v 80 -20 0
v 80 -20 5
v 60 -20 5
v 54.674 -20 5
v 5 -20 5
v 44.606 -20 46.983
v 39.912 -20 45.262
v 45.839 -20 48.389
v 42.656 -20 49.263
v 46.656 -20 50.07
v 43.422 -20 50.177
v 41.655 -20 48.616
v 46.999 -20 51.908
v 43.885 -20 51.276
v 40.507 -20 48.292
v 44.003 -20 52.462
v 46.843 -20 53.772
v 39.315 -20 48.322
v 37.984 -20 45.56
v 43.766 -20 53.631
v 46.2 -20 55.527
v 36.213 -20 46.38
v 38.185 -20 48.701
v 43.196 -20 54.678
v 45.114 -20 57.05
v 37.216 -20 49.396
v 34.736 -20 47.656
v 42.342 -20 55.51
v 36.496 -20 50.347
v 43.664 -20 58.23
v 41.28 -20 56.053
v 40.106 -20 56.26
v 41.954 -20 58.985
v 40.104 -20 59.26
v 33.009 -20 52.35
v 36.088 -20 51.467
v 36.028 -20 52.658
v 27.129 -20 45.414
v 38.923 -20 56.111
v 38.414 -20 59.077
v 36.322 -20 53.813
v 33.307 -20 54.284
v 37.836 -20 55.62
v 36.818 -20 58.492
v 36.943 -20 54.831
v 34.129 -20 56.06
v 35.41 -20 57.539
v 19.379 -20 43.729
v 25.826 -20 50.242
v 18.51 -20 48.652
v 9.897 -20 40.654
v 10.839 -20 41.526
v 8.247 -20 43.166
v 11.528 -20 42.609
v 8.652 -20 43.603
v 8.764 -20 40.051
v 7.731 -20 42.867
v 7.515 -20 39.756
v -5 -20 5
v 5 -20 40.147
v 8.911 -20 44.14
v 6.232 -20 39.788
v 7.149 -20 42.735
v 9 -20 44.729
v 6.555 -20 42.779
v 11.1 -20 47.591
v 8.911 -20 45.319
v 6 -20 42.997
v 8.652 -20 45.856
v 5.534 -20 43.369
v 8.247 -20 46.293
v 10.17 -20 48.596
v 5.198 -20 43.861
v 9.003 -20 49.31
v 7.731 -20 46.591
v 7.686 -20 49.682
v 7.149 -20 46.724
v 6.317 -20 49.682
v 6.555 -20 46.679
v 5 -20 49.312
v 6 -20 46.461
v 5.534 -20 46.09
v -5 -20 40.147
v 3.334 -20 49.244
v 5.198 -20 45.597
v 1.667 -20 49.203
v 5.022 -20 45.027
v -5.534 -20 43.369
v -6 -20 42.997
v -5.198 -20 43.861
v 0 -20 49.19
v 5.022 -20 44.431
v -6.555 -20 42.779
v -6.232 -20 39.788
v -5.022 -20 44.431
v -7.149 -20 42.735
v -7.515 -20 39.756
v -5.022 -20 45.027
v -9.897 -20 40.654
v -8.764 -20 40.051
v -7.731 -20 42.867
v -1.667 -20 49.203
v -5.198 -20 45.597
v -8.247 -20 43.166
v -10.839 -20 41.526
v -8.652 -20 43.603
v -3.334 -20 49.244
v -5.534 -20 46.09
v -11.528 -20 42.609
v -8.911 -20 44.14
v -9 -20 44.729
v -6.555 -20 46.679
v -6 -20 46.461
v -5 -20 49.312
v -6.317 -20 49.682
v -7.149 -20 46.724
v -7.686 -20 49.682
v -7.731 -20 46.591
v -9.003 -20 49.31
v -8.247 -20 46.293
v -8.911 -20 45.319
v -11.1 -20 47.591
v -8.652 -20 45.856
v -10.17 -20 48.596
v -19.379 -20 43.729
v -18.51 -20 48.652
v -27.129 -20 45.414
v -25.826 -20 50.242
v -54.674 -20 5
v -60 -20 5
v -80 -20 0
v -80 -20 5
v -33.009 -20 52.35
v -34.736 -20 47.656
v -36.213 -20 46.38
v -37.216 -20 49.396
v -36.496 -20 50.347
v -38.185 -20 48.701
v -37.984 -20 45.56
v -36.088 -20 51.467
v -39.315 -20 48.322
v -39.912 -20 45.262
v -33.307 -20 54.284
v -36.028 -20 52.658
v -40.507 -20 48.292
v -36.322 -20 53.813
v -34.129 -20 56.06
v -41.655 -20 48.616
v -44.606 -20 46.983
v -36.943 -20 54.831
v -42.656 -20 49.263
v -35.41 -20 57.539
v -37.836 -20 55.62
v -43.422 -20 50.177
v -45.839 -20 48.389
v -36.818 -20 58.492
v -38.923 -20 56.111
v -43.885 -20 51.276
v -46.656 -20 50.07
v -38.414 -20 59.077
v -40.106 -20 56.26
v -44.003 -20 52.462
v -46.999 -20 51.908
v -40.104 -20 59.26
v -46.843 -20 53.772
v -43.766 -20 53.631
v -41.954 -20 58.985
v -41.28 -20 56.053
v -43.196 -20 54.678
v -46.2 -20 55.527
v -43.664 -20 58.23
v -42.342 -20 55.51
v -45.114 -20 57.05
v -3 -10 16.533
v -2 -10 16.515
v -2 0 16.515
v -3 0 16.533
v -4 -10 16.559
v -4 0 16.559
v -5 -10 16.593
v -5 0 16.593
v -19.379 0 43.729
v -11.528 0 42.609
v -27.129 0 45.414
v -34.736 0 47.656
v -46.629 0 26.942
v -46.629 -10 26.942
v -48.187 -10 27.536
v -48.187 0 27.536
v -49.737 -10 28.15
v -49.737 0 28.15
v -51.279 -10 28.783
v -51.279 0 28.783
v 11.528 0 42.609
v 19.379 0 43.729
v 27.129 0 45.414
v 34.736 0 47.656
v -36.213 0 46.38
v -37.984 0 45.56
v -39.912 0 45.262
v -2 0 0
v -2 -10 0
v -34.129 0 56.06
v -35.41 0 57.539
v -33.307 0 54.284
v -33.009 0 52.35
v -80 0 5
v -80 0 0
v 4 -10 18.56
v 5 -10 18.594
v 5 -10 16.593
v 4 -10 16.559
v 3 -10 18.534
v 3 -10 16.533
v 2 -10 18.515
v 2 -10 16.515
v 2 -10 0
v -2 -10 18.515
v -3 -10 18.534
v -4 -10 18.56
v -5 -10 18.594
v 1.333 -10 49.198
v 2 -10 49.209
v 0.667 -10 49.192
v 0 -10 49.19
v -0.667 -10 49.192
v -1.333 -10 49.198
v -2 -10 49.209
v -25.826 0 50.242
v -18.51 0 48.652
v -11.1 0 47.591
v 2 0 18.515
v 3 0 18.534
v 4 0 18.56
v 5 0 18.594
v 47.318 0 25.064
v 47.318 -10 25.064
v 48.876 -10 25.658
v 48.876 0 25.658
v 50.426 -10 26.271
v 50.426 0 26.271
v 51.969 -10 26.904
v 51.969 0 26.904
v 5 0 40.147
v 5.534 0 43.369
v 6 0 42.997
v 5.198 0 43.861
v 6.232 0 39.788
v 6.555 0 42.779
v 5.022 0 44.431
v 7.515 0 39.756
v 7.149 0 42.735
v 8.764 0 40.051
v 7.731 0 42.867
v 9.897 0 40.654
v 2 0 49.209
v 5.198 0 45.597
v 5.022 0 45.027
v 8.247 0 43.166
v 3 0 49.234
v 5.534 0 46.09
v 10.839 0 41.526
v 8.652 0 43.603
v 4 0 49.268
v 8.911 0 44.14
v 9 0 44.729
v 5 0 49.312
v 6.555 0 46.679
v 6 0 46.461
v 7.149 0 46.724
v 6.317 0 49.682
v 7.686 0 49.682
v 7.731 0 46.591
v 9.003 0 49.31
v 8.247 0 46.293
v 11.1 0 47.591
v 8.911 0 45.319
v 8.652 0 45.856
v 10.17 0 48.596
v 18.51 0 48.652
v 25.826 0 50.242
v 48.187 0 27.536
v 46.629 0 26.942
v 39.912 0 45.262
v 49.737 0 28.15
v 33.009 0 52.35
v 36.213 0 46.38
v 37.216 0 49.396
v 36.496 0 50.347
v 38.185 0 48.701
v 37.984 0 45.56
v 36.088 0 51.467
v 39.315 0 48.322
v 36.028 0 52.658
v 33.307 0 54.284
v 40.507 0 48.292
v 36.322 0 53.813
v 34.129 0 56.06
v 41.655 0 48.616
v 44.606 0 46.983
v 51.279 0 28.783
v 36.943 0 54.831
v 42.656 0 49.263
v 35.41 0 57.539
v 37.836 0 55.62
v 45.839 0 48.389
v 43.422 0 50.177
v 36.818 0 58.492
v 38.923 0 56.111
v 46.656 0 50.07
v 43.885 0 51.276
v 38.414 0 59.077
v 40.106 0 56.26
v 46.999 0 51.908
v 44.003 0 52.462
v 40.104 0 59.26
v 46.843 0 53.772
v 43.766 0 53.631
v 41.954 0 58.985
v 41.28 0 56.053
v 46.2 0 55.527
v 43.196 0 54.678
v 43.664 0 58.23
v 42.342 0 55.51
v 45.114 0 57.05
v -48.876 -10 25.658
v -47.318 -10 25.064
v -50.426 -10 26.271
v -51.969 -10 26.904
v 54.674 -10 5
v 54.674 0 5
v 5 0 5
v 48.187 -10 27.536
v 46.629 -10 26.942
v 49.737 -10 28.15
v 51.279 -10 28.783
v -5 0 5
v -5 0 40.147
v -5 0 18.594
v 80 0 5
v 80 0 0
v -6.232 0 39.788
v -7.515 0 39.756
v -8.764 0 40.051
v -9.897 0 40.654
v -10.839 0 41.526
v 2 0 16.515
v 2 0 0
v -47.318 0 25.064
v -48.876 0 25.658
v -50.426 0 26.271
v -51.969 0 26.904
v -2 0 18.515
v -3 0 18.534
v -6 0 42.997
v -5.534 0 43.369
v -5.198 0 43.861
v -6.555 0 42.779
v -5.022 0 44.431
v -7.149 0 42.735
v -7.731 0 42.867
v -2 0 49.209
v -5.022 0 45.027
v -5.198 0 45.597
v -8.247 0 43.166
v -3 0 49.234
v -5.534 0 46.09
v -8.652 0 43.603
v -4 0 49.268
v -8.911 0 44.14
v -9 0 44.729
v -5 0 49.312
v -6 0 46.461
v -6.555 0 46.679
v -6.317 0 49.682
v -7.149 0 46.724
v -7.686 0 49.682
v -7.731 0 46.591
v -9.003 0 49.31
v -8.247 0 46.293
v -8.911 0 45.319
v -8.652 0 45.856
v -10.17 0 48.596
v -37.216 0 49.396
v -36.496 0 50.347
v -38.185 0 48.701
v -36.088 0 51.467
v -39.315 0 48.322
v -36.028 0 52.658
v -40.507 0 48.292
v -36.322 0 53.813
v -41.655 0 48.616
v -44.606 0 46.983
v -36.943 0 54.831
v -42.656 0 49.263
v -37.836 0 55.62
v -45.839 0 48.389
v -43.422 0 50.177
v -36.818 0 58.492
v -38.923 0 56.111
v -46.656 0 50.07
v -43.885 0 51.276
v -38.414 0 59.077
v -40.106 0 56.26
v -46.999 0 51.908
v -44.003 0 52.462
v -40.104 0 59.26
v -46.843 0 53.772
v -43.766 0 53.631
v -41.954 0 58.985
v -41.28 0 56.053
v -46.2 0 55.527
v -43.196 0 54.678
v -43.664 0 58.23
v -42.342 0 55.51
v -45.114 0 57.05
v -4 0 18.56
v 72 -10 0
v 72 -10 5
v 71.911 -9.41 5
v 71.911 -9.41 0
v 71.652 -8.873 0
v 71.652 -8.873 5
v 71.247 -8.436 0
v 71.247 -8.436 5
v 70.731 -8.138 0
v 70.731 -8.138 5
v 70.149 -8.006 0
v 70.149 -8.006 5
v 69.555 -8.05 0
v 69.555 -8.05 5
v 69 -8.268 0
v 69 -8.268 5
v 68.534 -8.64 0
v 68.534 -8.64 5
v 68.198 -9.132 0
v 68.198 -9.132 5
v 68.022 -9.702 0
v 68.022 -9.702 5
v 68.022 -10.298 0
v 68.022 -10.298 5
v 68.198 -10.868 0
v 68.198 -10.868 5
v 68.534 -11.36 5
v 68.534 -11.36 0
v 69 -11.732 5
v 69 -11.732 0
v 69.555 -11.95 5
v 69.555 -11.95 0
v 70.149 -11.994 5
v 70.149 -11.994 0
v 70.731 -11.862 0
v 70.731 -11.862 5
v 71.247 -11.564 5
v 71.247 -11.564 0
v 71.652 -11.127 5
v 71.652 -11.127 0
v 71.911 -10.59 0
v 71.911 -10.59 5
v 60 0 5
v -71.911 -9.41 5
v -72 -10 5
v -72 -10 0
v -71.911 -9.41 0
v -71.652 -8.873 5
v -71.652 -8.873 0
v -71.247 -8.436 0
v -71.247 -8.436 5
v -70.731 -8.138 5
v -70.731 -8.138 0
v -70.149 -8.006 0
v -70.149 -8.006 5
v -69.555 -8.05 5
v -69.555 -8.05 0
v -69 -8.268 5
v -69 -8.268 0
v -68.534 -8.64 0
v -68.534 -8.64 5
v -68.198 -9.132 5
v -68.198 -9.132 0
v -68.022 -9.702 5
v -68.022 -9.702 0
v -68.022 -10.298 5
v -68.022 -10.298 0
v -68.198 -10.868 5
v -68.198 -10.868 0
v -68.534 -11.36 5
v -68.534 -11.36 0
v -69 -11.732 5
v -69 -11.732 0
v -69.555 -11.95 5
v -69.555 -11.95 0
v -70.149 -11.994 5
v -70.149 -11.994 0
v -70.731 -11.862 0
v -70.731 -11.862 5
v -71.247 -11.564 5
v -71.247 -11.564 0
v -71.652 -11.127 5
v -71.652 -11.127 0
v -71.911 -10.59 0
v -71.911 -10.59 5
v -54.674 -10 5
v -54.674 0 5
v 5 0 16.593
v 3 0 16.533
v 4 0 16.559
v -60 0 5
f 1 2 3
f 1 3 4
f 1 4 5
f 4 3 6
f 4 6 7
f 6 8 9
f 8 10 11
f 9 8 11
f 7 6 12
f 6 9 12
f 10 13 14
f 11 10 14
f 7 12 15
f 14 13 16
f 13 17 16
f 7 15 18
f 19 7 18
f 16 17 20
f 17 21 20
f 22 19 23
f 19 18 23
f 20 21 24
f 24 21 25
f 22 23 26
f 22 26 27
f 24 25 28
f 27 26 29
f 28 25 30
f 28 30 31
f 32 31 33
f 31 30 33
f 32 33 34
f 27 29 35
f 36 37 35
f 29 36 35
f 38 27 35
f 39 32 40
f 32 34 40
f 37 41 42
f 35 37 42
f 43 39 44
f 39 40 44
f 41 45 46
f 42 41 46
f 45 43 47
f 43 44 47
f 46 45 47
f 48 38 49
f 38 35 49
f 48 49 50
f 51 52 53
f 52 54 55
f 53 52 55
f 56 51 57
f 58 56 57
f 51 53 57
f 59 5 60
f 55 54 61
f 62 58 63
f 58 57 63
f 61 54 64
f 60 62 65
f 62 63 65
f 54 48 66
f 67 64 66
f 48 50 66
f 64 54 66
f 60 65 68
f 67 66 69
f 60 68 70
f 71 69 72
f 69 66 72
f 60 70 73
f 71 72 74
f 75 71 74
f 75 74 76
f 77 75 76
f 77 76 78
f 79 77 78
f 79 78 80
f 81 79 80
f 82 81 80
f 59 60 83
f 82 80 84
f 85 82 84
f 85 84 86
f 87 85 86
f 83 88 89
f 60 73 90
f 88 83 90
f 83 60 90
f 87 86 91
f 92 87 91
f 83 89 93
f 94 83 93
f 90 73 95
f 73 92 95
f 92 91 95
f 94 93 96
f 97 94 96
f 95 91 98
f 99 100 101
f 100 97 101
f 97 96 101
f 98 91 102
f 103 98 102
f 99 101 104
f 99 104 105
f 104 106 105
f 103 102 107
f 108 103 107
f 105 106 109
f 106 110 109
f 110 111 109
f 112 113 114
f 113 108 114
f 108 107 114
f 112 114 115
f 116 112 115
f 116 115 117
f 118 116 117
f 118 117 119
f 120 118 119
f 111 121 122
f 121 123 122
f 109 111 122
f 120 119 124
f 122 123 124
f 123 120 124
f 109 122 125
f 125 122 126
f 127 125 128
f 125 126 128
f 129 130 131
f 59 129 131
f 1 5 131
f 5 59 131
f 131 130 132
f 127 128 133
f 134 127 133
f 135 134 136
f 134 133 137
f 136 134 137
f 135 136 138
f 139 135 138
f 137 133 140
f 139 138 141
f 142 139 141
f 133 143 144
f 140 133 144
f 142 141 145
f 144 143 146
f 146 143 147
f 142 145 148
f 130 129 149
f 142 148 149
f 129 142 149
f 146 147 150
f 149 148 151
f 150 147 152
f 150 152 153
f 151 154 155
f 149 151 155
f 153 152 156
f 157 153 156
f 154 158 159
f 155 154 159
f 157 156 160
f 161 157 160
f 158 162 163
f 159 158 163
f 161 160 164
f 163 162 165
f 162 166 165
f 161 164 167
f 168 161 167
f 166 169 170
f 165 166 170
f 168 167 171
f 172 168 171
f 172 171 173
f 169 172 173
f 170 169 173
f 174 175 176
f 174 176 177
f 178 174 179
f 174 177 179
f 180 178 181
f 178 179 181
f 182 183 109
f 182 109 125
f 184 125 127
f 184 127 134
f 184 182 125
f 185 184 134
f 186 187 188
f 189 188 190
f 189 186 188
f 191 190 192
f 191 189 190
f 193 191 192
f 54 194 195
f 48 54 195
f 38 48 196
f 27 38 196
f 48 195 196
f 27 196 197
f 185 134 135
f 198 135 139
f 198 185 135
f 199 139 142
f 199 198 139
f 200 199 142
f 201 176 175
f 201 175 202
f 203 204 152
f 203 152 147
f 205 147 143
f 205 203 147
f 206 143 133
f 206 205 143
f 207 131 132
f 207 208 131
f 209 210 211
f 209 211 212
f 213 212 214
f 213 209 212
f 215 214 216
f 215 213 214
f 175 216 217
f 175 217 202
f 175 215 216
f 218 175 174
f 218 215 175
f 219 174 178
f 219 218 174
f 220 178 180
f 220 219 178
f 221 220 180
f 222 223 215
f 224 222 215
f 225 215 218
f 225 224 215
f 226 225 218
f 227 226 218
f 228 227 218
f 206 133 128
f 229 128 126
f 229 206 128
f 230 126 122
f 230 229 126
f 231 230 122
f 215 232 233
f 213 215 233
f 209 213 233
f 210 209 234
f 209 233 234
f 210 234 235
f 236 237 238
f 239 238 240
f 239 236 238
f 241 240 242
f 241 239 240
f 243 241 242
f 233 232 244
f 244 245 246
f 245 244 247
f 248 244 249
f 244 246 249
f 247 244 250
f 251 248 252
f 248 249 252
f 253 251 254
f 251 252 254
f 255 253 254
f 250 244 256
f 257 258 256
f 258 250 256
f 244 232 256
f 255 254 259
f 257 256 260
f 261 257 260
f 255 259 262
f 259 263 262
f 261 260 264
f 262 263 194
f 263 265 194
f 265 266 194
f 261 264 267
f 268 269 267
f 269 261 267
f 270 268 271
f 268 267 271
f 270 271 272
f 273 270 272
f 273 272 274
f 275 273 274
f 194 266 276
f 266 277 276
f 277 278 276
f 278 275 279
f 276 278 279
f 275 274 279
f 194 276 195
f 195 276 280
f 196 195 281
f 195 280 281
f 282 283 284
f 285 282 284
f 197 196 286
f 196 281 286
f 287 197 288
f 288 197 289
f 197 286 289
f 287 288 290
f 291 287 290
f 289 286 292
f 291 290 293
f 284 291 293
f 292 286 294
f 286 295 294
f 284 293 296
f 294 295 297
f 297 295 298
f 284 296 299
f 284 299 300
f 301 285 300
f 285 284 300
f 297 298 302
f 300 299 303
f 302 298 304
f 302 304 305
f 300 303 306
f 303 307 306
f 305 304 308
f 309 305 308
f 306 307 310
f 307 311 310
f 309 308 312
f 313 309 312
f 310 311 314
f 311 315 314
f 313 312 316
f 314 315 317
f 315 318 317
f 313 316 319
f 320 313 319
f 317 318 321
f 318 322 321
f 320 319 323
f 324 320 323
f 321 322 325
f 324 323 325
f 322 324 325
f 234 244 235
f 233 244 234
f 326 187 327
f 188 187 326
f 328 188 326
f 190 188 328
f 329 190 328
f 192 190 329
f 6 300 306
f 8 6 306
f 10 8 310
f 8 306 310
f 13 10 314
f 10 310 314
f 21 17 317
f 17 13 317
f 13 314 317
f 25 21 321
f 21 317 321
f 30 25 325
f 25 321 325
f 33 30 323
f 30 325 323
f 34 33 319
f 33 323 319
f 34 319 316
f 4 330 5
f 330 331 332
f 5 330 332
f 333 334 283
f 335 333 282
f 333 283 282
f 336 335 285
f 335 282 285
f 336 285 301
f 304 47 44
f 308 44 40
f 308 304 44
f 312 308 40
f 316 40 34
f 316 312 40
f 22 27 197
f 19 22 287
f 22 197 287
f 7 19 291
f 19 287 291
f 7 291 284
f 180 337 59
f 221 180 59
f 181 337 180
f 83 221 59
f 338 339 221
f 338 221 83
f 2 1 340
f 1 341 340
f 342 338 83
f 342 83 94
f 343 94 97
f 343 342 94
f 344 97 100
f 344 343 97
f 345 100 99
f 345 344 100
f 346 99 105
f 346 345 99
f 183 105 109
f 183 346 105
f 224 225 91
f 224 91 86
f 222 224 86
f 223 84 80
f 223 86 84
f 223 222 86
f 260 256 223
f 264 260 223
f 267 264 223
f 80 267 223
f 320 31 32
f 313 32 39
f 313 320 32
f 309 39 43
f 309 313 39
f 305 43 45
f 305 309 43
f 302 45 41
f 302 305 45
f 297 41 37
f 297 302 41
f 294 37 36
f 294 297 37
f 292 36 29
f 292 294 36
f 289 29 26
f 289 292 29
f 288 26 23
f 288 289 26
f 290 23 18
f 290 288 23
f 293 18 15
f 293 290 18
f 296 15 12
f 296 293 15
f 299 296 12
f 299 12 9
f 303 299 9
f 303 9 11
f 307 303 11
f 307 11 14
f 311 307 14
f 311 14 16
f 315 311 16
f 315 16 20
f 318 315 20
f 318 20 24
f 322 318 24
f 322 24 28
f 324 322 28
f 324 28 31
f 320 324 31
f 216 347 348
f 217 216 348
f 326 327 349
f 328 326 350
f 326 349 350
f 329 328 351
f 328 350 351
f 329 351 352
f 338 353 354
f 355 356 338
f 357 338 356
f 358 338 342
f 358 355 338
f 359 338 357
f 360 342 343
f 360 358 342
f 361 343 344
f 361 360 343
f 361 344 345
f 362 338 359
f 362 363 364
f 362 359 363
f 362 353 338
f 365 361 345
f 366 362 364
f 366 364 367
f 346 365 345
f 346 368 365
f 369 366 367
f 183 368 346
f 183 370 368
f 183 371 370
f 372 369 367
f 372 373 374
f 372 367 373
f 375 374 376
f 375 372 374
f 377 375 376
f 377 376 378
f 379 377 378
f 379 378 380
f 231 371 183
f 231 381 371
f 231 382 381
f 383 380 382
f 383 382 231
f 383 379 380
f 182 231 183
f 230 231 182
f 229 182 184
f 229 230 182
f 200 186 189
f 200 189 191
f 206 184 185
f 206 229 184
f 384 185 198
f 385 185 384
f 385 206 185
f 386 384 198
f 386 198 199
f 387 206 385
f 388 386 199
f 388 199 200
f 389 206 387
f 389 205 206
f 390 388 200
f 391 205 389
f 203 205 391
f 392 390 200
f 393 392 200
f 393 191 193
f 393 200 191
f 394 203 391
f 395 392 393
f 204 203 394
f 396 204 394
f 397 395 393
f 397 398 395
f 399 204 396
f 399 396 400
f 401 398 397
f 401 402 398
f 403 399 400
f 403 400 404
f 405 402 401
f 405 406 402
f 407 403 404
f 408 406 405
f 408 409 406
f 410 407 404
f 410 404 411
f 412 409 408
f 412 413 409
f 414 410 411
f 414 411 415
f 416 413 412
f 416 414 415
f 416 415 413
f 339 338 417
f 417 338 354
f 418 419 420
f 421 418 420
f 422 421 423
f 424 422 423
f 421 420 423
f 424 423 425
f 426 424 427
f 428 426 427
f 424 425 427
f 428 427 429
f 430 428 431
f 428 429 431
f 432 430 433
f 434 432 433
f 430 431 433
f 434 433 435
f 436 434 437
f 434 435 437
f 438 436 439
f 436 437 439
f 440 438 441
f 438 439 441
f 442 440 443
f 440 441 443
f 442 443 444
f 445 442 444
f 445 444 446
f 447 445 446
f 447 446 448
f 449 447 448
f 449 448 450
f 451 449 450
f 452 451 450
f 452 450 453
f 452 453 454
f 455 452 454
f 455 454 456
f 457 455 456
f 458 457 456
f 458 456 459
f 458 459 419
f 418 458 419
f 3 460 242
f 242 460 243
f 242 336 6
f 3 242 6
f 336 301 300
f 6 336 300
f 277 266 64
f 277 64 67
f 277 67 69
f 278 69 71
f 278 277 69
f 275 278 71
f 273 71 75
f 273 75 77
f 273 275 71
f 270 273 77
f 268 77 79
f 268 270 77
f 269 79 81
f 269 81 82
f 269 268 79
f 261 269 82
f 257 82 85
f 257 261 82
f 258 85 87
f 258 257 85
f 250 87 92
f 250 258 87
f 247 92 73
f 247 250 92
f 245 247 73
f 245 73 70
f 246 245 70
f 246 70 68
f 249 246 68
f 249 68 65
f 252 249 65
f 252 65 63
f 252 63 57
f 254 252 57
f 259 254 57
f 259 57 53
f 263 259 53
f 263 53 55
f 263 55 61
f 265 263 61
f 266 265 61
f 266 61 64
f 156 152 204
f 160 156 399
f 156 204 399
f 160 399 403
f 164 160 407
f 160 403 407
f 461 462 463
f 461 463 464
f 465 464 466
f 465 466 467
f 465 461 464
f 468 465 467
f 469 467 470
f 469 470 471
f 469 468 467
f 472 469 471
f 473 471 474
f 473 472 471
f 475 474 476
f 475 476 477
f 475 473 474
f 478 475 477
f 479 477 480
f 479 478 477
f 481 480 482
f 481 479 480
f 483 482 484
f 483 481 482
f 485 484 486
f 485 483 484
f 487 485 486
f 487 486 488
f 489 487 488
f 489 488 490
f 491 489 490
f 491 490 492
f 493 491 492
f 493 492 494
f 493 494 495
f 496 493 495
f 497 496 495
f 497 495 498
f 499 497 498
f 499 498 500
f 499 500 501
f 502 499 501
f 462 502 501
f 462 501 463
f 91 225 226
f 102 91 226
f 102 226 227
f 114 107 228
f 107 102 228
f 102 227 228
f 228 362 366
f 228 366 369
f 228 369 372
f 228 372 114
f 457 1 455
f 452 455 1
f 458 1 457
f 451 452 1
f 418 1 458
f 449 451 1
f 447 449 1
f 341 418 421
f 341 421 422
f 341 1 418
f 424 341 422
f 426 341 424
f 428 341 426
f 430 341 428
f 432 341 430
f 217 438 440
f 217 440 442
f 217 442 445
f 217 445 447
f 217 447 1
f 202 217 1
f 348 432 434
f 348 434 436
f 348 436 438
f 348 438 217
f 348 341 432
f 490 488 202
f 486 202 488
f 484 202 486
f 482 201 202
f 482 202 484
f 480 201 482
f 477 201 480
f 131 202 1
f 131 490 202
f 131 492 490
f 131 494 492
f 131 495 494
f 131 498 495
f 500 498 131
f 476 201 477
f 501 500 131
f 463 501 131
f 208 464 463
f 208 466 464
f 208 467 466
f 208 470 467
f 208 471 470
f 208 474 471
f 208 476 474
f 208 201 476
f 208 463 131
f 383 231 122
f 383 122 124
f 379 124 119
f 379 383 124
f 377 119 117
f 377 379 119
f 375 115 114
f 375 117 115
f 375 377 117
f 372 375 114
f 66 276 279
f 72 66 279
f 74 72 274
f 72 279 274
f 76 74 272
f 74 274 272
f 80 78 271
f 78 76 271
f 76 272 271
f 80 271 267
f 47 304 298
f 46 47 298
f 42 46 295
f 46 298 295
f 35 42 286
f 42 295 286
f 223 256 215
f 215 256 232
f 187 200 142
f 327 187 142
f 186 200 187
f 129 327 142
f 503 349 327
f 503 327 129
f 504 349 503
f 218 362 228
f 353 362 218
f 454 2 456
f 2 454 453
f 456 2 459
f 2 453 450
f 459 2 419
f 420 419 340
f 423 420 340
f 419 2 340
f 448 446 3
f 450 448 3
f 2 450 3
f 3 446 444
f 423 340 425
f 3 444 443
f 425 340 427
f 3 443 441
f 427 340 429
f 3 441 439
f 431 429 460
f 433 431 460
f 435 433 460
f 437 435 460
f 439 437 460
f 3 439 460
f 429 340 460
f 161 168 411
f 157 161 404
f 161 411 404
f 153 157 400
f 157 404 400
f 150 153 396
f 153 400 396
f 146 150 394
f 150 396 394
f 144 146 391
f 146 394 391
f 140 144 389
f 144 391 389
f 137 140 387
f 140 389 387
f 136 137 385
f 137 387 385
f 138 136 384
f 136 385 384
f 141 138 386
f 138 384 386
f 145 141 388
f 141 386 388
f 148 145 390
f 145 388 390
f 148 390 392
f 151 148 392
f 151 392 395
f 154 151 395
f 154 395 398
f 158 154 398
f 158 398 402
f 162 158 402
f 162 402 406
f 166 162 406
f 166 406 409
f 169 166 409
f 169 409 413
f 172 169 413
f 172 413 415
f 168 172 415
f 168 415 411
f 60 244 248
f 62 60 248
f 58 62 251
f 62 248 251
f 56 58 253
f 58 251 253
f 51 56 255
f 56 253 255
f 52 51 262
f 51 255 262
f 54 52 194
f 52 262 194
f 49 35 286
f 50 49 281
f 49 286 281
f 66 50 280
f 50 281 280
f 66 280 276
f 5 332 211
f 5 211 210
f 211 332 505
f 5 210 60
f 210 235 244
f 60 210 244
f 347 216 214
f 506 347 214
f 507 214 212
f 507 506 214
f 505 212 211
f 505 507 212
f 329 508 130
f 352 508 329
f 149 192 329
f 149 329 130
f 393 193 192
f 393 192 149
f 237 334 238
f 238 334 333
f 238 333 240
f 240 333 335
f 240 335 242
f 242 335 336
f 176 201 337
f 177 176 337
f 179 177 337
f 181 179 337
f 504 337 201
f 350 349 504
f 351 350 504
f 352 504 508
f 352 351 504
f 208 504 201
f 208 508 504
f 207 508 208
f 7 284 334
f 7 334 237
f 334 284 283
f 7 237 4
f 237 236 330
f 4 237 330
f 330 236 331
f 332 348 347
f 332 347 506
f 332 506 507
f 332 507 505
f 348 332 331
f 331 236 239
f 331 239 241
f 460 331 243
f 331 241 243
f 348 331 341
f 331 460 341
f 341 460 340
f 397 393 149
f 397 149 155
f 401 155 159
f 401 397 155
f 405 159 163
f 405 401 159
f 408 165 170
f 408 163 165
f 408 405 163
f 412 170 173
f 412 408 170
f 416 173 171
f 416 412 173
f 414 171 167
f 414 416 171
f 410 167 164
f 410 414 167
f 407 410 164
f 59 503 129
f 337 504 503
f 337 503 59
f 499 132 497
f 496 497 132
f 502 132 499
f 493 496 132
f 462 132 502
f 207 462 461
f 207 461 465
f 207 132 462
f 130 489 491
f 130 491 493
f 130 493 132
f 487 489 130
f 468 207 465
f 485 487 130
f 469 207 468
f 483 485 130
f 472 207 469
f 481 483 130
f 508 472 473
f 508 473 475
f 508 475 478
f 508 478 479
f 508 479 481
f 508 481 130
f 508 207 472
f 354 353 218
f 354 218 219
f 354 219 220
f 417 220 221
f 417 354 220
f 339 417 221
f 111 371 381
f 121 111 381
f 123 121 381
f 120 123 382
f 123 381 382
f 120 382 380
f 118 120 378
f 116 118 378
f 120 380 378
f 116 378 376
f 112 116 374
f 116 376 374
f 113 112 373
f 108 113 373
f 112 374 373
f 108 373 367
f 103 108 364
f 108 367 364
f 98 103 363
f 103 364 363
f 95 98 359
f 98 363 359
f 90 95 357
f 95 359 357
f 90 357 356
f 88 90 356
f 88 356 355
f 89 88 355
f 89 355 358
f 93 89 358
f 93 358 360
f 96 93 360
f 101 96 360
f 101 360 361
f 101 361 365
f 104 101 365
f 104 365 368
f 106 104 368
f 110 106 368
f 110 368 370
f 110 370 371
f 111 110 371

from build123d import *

# Parameters (mm, degrees)
F1_W      = 80
F1_H      = 5
F2_DEPTH  = 10
F3_W      = 5
F3_H      = 151.5
F4_DEPTH  = 10
F5_W      = 21
F5_H      = 23
F6_DEPTH  = 10
F8_DEPTH  = 10
F10_DEPTH = 10
F12_DEPTH = 10
F14_DEPTH = 20
F15_W     = 0.9078182304
F15_H     = 2
F16_DEPTH = 10
F17_R     = 135
F17_R_2   = 133
F18_DEPTH = 10
F19_R     = 7
F19_R_2   = 4
F20_DEPTH = 20
F21_R     = 4
F22_DEPTH = 20.001
F23_R     = 5
F23_R_2   = 2
F24_DEPTH = 20
F26_DEPTH = 20
F28_DEPTH = 20.001
F29_R     = 2
F30_DEPTH = 5.001


# Not quite as in the source:
# - ends of sketch curves that miss each other by under 0.0002 mm in the source are joined


with BuildPart() as f2:
    # F1 (on Front) → F2 (new body)
    with BuildSketch(Plane.XZ):
        with Locations((40, 2.5)):
            Rectangle(F1_W, F1_H)
    extrude(amount=F2_DEPTH)

    # F3 (on Front) → F4 (join, through all)
    with BuildSketch(Plane.XZ):
        with Locations((2.5, 75.75)):
            Rectangle(F3_W, F3_H)
    extrude(amount=F4_DEPTH)

    # F5 (on Front) → F6 (join, through all)
    with BuildSketch(Plane.XZ):
        with Locations((10.5, 151.5)):
            Rectangle(F5_W, F5_H)
    extrude(amount=F6_DEPTH)

    # F7 (on Front) → F8 (join, through all)
    with BuildSketch(Plane.XZ):
        Polygon((60, 5), (9.8688664765, 141.7212732458), (5.1744848971, 140), (55.3056184206, 3.2787267542), align=None)
    extrude(amount=F8_DEPTH)

    # F9 (on face) → F10 (join)
    with BuildSketch(Plane.XZ.offset(10)):
        Polygon((0, 163), (0, 0), (80, 0), (80, 5), (60, 5), (10.5, 140), (21, 140), (21, 163), align=None)
        Polygon((5.1744848971, 140), (54.6744848971, 5), (5, 5), (5, 140), align=None, mode=Mode.SUBTRACT)
    extrude(amount=F10_DEPTH)

    # F11 (on face) → F12 (cut)
    with BuildSketch(Plane(origin=(0, 0, 0), x_dir=(-1, 0, 0), z_dir=(0, 1, 0))):
        Polygon((-2, 0), (0, 0), (0, 140), (-21, 140), (-21, 138), (-2, 138), align=None)
    extrude(amount=-F12_DEPTH, mode=Mode.SUBTRACT)

    # F13 (on face) → F14 (join)
    with BuildSketch(Plane(origin=(0, 0, 0), x_dir=(-1, 0, 0), z_dir=(0, 1, 0))):
        Polygon((-2, 133), (-2, 138), (-11.2333333333, 138), (-13.0666666667, 133), align=None)
    extrude(amount=-F14_DEPTH)

    # F15 (on face) → F16 (join)
    with BuildSketch(Plane.XZ.offset(20)):
        with Locations((5.4539091152, 139)):
            Rectangle(F15_W, F15_H)
    extrude(amount=-F16_DEPTH)

    # F17 (on Front) → F18 (cut)
    with BuildSketch(Plane.XZ):
        with Locations((0, 151.5)):
            Circle(F17_R)
        with Locations((0, 151.5)):
            Circle(F17_R_2, mode=Mode.SUBTRACT)
    extrude(amount=F18_DEPTH, mode=Mode.SUBTRACT)

    # F19 (on Front) → F20 (join, through all)
    with BuildSketch(Plane.XZ):
        with Locations((40.0081513066, 52.2611576598)):
            Circle(F19_R)
        with Locations((40.0081513066, 52.2611576598)):
            Circle(F19_R_2, mode=Mode.SUBTRACT)
    extrude(amount=F20_DEPTH)

    # F21 (on Front) → F22 (cut, through all)
    with BuildSketch(Plane.XZ):
        with Locations((40.0081513066, 52.2611576598)):
            Circle(F21_R)
    extrude(amount=F22_DEPTH, mode=Mode.SUBTRACT)

    # F23 (on Front) → F24 (join, through all)
    with BuildSketch(Plane.XZ):
        with Locations((7, 44.7292174797)):
            Circle(F23_R)
        with Locations((7, 44.7292174797)):
            Circle(F23_R_2, mode=Mode.SUBTRACT)
    extrude(amount=F24_DEPTH)

    # F25 (on Front) → F26 (join, through all)
    with BuildSketch(Plane.XZ):
        with BuildLine():
            Line((8.7843409429, 47.3698633718), (8.9944926401, 44.8787117779))
            ThreePointArc((8.9944926401, 44.8787117779), (22.8274604253, 46.9633698145), (36.2703225327, 50.8348933176))
            Line((36.2703225327, 50.8348933176), (35.4228850903, 53.1868817915))
            ThreePointArc((35.4228850903, 53.1868817915), (22.294150224, 49.4058235462), (8.7843409429, 47.3698633718))
        make_face()
        with BuildLine():
            ThreePointArc((36.2703225327, 50.8348933176), (22.8274604253, 46.9633698145), (8.9944055882, 44.8787044343))
            Line((8.9944055882, 44.8787044343), (9.2046443373, 42.3875601839))
            ThreePointArc((9.2046443373, 42.3875601839), (23.3608559764, 44.5209347206), (37.117759975, 48.4829048437))
            Line((37.117759975, 48.4829048437), (36.2703225327, 50.8348933176))
        make_face()
    extrude(amount=F26_DEPTH)

    # F27 (on Front) → F28 (cut, through all)
    with BuildSketch(Plane.XZ):
        with BuildLine():
            ThreePointArc((5, 49.3117931746), (8.3573933592, 49.5414397593), (11.0998968806, 47.5911828128))
            ThreePointArc((11.0998968806, 47.5911828128), (22.1823046987, 49.3814641789), (33.0087181874, 52.3502419386))
            ThreePointArc((33.0087181874, 52.3502419386), (38.6064619078, 59.1193838757), (46.4113234148, 55.0894764101))
            ThreePointArc((46.4113234148, 55.0894764101), (104.3190443402, 175.3020374745), (0, 258.5))
            Line((0, 258.5), (0, 253.8104570129))
            ThreePointArc((0, 253.8104570129), (-102.2798898997, 148.9992528562), (5, 49.3117931746))
        make_face()
    extrude(amount=F28_DEPTH, mode=Mode.SUBTRACT)

    # F29 (on face) → F30 (cut, through all)
    with BuildSketch(Plane.XY.offset(5)):
        with Locations((70, -10)):
            Circle(F29_R)
    extrude(amount=-F30_DEPTH, mode=Mode.SUBTRACT)

    # F31: F2 across plane


with BuildPart() as f2_1:
    add(f2.part)
    add(f2.part.mirror(Plane.YZ))


solid = f2_1.part
